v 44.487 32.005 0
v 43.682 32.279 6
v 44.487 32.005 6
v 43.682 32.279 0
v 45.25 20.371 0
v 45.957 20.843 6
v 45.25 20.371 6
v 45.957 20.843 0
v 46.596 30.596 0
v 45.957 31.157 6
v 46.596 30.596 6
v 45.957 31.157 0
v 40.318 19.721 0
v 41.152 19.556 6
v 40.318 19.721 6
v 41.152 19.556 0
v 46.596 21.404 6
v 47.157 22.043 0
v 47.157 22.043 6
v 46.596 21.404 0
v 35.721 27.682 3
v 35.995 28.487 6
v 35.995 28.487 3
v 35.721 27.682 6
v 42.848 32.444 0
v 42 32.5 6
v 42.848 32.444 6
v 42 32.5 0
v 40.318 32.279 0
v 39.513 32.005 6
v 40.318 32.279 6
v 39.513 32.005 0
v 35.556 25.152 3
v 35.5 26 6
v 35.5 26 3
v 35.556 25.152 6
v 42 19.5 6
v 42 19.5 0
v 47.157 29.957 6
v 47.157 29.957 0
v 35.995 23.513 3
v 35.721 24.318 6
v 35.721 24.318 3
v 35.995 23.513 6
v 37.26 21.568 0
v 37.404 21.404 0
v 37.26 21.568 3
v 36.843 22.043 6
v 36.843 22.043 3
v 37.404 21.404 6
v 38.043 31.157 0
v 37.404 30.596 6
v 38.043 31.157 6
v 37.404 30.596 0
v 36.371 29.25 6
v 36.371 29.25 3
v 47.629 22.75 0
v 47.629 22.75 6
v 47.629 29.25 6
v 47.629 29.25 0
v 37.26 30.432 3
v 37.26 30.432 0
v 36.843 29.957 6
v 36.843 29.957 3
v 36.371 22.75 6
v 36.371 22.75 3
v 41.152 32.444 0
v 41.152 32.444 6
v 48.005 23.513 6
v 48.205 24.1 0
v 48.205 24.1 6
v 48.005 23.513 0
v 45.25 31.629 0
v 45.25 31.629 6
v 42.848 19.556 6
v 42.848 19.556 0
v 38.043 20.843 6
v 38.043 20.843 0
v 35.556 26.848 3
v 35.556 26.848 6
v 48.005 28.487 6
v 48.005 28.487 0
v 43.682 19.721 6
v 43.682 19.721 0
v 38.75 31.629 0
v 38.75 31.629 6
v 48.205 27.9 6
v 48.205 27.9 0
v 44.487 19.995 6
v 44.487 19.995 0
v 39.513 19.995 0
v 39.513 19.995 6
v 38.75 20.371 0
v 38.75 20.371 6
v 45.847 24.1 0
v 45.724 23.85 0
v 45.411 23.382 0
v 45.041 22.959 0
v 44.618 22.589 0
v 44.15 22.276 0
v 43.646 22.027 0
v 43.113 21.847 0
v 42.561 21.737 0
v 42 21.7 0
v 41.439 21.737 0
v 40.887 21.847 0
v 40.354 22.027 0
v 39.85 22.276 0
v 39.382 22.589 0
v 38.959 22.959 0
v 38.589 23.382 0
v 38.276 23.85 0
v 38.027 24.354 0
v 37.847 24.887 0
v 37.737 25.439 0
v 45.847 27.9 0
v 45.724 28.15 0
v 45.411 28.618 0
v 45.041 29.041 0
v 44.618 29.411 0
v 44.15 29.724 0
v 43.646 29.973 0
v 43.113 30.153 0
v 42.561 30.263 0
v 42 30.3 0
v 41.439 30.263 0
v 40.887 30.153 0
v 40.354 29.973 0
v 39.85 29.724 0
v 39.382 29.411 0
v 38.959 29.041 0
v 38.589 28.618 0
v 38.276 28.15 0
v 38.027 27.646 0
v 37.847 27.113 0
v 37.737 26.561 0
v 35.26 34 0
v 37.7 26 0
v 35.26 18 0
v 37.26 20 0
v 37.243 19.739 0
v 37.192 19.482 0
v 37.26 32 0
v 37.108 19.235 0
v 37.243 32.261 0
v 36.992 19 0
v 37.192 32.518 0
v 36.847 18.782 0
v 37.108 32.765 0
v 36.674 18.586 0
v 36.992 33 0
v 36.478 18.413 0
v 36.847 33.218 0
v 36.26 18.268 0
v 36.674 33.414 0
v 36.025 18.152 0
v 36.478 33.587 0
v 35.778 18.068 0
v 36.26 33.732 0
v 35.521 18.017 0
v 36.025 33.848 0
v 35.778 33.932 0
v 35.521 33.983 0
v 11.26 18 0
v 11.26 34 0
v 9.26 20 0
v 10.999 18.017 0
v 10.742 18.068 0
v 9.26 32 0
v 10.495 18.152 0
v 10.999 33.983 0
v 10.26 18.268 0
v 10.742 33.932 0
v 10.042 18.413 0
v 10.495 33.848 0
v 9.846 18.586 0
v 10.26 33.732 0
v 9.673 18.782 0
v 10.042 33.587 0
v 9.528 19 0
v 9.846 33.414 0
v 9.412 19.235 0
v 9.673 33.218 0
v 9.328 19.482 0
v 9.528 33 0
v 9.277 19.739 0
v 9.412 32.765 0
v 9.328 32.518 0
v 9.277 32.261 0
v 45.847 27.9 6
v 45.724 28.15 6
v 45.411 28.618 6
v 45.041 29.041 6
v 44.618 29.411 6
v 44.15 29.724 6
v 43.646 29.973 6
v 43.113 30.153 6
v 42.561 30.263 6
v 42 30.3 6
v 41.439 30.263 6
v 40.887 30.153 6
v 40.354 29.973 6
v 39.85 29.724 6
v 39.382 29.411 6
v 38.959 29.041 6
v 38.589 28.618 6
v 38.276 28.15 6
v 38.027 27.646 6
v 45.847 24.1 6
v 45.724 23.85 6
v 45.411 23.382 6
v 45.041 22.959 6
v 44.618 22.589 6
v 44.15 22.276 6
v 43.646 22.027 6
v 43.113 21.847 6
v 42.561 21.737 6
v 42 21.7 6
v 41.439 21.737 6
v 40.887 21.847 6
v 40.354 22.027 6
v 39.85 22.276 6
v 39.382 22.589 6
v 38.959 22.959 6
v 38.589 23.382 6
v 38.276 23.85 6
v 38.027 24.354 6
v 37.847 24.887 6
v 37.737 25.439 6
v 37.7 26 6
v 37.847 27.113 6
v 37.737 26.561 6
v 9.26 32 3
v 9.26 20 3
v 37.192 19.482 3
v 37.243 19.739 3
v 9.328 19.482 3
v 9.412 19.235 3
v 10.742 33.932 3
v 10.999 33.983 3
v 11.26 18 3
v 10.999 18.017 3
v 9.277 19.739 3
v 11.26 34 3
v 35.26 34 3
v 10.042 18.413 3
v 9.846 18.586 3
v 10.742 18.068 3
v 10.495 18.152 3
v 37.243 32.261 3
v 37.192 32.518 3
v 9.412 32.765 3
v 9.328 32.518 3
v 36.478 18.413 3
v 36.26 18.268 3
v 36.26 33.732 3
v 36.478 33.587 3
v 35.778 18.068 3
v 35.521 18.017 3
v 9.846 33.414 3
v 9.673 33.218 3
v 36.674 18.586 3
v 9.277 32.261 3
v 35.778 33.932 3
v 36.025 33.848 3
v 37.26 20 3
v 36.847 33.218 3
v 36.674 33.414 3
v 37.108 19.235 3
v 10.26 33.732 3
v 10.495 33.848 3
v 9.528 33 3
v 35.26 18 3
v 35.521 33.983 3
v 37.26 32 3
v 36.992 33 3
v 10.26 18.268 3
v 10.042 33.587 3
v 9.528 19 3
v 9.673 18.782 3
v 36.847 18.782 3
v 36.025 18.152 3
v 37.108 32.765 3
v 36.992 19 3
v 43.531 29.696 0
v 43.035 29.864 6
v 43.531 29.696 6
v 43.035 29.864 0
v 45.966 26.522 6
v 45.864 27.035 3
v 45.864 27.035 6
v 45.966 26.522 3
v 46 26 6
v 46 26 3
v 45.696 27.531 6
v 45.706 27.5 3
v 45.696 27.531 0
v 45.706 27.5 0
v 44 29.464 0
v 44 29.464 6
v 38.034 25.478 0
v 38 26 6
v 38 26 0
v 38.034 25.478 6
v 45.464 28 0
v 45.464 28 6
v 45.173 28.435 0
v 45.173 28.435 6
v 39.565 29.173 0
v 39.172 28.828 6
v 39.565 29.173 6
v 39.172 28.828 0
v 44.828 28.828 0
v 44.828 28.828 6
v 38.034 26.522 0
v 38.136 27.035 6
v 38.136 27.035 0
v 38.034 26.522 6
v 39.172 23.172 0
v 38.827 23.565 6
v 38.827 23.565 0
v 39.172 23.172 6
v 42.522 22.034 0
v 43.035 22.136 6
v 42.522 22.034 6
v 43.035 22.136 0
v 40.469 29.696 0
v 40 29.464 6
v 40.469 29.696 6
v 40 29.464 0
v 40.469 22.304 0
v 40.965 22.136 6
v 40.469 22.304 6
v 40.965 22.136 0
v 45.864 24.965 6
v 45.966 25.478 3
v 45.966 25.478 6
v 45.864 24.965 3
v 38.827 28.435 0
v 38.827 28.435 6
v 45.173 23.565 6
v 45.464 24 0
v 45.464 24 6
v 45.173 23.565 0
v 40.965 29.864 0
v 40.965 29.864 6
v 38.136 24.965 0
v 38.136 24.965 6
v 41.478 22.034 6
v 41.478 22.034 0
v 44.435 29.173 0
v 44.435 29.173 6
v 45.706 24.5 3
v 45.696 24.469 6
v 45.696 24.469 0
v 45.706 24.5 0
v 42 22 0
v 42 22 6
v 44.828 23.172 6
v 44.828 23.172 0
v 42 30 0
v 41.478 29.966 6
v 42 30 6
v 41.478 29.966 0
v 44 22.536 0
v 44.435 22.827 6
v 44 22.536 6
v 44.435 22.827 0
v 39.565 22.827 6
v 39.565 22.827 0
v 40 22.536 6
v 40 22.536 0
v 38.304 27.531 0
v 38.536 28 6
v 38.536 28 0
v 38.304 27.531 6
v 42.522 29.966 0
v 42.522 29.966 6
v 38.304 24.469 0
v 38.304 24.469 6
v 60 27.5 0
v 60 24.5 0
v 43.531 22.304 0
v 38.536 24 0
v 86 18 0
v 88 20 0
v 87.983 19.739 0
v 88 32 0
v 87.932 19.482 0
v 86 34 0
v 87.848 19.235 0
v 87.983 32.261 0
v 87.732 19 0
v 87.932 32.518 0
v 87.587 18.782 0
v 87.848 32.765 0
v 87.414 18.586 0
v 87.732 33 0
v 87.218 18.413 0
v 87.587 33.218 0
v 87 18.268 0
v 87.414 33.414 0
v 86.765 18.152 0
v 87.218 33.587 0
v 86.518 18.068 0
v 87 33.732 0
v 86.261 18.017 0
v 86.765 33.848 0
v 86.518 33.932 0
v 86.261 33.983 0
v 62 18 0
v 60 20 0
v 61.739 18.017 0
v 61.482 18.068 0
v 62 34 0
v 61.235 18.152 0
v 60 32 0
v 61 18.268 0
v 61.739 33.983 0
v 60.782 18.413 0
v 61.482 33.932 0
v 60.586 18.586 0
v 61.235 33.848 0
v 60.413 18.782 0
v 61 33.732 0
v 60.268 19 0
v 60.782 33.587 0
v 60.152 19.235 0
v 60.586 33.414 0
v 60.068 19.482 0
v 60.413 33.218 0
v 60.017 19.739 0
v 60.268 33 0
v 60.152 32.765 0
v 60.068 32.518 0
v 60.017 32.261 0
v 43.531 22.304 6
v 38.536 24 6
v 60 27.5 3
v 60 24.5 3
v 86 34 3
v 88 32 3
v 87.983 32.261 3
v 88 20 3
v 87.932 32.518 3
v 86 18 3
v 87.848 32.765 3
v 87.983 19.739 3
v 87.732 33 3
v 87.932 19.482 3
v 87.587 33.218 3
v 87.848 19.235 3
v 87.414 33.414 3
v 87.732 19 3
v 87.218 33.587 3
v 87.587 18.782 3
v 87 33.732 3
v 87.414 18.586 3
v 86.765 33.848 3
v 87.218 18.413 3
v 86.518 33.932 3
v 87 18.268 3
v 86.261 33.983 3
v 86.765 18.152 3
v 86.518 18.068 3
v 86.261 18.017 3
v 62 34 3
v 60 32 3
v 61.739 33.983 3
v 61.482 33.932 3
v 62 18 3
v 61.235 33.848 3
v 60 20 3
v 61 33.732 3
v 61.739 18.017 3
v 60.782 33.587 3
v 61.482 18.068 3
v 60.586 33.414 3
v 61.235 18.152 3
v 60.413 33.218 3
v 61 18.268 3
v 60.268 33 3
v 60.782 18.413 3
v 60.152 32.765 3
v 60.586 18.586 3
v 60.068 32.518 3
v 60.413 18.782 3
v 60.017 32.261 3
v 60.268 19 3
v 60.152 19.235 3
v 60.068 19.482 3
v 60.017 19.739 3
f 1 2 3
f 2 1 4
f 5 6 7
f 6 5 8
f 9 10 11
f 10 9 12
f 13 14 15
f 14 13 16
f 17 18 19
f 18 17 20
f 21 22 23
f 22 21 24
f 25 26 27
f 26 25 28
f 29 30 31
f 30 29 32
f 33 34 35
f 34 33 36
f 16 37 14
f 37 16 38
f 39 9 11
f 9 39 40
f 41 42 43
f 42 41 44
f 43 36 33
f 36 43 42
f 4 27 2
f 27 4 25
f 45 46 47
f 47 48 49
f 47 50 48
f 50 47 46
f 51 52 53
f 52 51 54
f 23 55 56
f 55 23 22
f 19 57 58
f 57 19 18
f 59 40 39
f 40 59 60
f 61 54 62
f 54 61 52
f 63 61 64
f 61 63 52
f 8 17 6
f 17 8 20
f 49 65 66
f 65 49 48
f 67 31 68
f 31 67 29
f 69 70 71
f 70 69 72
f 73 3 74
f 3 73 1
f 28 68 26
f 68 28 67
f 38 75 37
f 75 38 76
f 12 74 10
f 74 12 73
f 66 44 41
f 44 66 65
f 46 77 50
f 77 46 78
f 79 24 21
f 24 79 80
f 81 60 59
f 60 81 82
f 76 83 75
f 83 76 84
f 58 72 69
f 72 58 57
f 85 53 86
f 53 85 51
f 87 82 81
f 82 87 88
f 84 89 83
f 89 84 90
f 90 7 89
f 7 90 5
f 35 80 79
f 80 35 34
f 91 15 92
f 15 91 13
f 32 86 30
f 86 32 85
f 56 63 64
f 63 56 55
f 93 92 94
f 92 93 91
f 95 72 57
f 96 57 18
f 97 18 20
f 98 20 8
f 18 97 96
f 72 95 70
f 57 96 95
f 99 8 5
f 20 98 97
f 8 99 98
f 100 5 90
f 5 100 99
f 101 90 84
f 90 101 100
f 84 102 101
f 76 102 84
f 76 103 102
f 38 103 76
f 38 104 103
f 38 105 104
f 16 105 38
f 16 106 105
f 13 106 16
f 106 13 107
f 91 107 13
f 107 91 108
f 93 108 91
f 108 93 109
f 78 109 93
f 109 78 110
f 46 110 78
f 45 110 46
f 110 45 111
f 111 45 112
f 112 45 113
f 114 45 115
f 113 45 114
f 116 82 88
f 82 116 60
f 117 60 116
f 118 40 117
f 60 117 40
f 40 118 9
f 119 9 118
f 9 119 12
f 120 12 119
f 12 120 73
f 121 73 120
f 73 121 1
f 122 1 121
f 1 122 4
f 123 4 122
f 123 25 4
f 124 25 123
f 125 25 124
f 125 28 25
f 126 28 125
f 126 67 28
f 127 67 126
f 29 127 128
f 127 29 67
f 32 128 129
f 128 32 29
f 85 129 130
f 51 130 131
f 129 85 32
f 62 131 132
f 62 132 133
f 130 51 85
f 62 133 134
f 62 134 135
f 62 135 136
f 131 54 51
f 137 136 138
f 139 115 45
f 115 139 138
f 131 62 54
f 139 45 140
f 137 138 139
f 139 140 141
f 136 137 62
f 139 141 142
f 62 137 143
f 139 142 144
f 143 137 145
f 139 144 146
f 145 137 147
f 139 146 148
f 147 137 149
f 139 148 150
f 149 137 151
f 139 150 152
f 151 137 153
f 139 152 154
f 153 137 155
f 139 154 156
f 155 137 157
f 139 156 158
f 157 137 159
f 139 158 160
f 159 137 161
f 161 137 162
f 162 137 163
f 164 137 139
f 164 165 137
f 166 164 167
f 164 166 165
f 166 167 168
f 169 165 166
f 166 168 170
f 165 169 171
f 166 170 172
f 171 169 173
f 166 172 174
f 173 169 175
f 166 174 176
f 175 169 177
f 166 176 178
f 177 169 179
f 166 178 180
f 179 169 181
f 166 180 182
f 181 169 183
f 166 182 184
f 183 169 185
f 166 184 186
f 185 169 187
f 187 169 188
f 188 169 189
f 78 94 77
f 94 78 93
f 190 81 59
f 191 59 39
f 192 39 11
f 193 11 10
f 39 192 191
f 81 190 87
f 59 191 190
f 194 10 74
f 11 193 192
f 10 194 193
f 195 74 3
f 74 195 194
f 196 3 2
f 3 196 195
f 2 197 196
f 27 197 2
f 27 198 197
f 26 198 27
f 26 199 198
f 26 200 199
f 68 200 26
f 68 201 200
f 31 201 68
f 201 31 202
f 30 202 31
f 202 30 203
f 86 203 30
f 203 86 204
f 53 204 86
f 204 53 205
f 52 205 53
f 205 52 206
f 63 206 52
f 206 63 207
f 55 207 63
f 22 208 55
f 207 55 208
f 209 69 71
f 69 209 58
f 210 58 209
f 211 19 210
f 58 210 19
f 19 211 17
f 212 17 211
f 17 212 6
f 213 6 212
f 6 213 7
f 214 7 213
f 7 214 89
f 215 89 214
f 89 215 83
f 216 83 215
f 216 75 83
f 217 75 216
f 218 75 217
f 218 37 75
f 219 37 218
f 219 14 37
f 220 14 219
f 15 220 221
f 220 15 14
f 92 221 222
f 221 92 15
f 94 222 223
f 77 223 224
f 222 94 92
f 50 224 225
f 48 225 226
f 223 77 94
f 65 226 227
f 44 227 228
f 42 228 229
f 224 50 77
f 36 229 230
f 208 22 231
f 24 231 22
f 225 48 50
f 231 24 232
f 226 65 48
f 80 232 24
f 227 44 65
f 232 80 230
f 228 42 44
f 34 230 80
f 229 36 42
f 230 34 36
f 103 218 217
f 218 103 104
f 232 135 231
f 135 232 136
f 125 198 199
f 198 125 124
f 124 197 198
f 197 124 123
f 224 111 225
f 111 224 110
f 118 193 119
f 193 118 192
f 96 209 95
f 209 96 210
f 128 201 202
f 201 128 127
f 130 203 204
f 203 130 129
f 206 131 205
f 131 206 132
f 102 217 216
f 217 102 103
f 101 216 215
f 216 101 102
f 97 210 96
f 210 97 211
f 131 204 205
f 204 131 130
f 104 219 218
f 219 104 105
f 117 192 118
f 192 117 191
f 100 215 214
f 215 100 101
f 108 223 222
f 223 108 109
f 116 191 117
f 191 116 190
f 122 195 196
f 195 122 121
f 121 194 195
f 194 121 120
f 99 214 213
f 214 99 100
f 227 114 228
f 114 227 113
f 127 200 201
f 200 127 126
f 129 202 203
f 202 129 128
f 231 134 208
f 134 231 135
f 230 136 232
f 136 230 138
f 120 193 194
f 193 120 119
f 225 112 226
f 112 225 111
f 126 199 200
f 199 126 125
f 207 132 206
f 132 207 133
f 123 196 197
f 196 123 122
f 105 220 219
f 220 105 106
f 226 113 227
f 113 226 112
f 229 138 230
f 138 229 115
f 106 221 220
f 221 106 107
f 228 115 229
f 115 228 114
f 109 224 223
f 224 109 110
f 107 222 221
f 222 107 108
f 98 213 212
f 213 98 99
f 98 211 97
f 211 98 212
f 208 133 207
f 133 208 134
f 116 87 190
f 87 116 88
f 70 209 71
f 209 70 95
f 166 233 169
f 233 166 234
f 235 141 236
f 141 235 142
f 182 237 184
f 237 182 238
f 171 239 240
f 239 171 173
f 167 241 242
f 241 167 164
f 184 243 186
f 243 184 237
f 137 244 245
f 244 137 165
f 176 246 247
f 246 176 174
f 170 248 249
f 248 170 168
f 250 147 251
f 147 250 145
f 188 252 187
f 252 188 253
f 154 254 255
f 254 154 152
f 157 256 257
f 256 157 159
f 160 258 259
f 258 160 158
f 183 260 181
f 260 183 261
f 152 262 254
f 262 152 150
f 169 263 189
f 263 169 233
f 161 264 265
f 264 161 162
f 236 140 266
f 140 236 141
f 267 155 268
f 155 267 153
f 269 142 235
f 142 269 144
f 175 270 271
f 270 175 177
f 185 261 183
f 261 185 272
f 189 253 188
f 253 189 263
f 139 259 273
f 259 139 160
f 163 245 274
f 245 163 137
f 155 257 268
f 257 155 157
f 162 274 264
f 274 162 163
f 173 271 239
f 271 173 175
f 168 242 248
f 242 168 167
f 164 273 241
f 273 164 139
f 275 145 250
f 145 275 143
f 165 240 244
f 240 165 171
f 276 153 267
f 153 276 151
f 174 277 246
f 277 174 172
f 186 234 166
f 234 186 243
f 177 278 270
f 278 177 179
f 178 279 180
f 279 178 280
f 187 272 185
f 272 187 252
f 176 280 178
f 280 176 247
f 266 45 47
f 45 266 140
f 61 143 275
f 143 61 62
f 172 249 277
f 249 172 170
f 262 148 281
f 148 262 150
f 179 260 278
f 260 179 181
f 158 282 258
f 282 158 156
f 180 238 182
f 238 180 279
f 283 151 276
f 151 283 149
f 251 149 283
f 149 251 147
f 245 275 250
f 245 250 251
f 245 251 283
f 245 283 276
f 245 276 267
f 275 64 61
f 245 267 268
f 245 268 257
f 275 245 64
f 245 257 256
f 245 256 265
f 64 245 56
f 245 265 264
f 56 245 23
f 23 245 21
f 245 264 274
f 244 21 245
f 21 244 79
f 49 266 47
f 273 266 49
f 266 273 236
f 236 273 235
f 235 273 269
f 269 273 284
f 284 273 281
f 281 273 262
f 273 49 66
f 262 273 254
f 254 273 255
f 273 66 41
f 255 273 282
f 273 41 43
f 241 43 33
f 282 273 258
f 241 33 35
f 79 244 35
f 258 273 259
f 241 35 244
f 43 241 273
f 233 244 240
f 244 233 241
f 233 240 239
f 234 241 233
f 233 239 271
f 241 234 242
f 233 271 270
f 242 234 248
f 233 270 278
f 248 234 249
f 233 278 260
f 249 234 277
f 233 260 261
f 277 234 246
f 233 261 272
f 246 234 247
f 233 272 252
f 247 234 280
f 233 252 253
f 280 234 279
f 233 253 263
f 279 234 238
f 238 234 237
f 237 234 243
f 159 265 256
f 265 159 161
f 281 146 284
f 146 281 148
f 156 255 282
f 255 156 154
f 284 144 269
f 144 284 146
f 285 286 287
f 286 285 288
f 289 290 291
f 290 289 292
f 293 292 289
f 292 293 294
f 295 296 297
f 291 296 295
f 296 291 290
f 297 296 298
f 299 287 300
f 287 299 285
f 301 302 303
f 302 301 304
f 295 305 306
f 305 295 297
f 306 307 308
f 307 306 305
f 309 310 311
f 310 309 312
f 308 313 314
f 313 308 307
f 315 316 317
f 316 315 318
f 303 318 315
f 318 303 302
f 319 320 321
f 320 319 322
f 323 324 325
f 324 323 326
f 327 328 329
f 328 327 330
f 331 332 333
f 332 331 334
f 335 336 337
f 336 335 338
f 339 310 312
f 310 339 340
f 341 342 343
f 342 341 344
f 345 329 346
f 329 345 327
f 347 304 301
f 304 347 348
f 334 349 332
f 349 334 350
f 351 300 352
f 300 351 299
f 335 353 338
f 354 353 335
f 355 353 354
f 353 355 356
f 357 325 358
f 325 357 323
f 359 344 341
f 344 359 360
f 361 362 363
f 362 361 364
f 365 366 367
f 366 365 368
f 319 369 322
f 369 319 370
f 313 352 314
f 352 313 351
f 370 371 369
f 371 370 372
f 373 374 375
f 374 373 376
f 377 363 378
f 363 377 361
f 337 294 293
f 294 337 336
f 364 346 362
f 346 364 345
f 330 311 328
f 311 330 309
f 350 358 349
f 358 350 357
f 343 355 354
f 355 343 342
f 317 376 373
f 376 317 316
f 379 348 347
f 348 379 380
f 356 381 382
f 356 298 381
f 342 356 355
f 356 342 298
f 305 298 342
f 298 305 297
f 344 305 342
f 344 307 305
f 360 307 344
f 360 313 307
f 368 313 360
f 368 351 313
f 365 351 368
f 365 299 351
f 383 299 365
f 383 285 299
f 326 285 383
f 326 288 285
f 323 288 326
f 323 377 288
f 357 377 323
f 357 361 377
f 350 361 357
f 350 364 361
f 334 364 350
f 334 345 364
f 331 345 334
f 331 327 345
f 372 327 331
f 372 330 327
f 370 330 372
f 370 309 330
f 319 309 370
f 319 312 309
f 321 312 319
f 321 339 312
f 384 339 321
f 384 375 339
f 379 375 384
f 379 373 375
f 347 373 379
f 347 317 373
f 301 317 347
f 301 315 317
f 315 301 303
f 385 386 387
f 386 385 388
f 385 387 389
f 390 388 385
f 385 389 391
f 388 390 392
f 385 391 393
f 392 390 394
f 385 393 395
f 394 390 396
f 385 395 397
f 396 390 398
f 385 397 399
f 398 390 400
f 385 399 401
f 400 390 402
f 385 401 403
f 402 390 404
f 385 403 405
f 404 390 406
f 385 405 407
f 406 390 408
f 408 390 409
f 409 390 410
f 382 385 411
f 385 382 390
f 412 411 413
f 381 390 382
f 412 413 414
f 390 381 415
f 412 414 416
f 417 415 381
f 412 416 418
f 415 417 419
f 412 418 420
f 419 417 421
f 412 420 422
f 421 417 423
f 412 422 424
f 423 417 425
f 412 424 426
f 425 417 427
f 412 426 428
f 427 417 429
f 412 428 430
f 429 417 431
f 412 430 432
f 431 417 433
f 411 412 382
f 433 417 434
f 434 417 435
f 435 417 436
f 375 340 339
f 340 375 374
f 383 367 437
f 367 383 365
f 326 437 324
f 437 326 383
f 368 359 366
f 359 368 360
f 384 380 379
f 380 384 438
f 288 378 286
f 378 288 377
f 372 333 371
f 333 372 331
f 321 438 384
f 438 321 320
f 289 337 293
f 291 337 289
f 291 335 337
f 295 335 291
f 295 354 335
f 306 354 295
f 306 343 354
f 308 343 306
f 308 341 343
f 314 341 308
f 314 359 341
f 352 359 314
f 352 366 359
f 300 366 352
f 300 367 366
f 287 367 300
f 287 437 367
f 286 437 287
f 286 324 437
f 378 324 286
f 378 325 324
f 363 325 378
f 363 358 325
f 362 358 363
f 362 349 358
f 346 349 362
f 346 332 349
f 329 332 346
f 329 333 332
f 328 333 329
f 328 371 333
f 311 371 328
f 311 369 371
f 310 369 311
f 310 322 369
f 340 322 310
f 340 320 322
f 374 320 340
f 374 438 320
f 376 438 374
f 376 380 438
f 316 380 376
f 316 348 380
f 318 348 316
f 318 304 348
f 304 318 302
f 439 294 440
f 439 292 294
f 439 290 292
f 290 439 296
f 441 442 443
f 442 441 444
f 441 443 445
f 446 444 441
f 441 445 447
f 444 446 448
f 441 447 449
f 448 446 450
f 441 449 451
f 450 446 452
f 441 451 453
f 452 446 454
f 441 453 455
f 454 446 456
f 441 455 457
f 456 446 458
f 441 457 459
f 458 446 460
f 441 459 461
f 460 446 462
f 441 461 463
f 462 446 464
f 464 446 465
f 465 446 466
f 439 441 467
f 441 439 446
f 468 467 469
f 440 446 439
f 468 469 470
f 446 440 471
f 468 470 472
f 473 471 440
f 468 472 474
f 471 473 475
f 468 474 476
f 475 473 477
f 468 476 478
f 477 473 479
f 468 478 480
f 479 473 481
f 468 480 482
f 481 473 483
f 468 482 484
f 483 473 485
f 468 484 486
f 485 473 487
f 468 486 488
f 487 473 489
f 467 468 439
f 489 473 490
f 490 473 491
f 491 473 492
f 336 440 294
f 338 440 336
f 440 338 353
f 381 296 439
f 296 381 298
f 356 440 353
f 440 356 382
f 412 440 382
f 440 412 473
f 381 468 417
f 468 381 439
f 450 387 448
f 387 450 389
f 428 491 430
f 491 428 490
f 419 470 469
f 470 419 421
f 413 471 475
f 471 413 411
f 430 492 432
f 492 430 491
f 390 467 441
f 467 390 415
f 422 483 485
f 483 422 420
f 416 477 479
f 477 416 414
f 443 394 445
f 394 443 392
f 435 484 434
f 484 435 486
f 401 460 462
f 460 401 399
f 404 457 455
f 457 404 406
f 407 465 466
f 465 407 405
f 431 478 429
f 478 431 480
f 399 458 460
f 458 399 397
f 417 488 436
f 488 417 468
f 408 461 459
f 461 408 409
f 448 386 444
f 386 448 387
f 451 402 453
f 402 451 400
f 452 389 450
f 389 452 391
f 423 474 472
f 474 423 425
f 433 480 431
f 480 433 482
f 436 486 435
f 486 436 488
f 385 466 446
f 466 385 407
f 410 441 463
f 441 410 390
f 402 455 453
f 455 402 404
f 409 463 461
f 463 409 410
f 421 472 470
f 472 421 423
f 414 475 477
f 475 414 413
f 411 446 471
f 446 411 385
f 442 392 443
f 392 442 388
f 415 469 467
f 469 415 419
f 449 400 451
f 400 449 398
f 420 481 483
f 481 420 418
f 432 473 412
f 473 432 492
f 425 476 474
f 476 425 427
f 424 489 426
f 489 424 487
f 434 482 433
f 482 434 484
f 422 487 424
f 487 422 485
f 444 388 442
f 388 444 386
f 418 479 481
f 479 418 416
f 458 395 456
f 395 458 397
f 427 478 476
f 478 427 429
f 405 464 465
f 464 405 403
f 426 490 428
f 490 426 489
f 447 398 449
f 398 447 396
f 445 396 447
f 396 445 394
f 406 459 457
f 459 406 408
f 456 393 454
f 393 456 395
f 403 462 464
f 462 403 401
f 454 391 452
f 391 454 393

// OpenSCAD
/*
Sample 007: Print-in-Place-Flachdrehgelenk — 0,30 mm
Generated from the FDM Mechanical Sample Library.
Units: millimetres.

Override examples:
  openscad -o custom.stl -D 'view="plate"' -D 'render_fn=64' model.scad
  openscad -o preview.png -D 'view="assembly"' model.scad
*/
use <../../../library/fdm_mechanisms.scad>

render_fn = is_undef(render_fn) ? 48 : render_fn;
view = is_undef(view) ? "plate" : view;
$fn = render_fn;

sample_pip_pivot(
    view=view,
    clearance=0.3,
    core_d=8
);
